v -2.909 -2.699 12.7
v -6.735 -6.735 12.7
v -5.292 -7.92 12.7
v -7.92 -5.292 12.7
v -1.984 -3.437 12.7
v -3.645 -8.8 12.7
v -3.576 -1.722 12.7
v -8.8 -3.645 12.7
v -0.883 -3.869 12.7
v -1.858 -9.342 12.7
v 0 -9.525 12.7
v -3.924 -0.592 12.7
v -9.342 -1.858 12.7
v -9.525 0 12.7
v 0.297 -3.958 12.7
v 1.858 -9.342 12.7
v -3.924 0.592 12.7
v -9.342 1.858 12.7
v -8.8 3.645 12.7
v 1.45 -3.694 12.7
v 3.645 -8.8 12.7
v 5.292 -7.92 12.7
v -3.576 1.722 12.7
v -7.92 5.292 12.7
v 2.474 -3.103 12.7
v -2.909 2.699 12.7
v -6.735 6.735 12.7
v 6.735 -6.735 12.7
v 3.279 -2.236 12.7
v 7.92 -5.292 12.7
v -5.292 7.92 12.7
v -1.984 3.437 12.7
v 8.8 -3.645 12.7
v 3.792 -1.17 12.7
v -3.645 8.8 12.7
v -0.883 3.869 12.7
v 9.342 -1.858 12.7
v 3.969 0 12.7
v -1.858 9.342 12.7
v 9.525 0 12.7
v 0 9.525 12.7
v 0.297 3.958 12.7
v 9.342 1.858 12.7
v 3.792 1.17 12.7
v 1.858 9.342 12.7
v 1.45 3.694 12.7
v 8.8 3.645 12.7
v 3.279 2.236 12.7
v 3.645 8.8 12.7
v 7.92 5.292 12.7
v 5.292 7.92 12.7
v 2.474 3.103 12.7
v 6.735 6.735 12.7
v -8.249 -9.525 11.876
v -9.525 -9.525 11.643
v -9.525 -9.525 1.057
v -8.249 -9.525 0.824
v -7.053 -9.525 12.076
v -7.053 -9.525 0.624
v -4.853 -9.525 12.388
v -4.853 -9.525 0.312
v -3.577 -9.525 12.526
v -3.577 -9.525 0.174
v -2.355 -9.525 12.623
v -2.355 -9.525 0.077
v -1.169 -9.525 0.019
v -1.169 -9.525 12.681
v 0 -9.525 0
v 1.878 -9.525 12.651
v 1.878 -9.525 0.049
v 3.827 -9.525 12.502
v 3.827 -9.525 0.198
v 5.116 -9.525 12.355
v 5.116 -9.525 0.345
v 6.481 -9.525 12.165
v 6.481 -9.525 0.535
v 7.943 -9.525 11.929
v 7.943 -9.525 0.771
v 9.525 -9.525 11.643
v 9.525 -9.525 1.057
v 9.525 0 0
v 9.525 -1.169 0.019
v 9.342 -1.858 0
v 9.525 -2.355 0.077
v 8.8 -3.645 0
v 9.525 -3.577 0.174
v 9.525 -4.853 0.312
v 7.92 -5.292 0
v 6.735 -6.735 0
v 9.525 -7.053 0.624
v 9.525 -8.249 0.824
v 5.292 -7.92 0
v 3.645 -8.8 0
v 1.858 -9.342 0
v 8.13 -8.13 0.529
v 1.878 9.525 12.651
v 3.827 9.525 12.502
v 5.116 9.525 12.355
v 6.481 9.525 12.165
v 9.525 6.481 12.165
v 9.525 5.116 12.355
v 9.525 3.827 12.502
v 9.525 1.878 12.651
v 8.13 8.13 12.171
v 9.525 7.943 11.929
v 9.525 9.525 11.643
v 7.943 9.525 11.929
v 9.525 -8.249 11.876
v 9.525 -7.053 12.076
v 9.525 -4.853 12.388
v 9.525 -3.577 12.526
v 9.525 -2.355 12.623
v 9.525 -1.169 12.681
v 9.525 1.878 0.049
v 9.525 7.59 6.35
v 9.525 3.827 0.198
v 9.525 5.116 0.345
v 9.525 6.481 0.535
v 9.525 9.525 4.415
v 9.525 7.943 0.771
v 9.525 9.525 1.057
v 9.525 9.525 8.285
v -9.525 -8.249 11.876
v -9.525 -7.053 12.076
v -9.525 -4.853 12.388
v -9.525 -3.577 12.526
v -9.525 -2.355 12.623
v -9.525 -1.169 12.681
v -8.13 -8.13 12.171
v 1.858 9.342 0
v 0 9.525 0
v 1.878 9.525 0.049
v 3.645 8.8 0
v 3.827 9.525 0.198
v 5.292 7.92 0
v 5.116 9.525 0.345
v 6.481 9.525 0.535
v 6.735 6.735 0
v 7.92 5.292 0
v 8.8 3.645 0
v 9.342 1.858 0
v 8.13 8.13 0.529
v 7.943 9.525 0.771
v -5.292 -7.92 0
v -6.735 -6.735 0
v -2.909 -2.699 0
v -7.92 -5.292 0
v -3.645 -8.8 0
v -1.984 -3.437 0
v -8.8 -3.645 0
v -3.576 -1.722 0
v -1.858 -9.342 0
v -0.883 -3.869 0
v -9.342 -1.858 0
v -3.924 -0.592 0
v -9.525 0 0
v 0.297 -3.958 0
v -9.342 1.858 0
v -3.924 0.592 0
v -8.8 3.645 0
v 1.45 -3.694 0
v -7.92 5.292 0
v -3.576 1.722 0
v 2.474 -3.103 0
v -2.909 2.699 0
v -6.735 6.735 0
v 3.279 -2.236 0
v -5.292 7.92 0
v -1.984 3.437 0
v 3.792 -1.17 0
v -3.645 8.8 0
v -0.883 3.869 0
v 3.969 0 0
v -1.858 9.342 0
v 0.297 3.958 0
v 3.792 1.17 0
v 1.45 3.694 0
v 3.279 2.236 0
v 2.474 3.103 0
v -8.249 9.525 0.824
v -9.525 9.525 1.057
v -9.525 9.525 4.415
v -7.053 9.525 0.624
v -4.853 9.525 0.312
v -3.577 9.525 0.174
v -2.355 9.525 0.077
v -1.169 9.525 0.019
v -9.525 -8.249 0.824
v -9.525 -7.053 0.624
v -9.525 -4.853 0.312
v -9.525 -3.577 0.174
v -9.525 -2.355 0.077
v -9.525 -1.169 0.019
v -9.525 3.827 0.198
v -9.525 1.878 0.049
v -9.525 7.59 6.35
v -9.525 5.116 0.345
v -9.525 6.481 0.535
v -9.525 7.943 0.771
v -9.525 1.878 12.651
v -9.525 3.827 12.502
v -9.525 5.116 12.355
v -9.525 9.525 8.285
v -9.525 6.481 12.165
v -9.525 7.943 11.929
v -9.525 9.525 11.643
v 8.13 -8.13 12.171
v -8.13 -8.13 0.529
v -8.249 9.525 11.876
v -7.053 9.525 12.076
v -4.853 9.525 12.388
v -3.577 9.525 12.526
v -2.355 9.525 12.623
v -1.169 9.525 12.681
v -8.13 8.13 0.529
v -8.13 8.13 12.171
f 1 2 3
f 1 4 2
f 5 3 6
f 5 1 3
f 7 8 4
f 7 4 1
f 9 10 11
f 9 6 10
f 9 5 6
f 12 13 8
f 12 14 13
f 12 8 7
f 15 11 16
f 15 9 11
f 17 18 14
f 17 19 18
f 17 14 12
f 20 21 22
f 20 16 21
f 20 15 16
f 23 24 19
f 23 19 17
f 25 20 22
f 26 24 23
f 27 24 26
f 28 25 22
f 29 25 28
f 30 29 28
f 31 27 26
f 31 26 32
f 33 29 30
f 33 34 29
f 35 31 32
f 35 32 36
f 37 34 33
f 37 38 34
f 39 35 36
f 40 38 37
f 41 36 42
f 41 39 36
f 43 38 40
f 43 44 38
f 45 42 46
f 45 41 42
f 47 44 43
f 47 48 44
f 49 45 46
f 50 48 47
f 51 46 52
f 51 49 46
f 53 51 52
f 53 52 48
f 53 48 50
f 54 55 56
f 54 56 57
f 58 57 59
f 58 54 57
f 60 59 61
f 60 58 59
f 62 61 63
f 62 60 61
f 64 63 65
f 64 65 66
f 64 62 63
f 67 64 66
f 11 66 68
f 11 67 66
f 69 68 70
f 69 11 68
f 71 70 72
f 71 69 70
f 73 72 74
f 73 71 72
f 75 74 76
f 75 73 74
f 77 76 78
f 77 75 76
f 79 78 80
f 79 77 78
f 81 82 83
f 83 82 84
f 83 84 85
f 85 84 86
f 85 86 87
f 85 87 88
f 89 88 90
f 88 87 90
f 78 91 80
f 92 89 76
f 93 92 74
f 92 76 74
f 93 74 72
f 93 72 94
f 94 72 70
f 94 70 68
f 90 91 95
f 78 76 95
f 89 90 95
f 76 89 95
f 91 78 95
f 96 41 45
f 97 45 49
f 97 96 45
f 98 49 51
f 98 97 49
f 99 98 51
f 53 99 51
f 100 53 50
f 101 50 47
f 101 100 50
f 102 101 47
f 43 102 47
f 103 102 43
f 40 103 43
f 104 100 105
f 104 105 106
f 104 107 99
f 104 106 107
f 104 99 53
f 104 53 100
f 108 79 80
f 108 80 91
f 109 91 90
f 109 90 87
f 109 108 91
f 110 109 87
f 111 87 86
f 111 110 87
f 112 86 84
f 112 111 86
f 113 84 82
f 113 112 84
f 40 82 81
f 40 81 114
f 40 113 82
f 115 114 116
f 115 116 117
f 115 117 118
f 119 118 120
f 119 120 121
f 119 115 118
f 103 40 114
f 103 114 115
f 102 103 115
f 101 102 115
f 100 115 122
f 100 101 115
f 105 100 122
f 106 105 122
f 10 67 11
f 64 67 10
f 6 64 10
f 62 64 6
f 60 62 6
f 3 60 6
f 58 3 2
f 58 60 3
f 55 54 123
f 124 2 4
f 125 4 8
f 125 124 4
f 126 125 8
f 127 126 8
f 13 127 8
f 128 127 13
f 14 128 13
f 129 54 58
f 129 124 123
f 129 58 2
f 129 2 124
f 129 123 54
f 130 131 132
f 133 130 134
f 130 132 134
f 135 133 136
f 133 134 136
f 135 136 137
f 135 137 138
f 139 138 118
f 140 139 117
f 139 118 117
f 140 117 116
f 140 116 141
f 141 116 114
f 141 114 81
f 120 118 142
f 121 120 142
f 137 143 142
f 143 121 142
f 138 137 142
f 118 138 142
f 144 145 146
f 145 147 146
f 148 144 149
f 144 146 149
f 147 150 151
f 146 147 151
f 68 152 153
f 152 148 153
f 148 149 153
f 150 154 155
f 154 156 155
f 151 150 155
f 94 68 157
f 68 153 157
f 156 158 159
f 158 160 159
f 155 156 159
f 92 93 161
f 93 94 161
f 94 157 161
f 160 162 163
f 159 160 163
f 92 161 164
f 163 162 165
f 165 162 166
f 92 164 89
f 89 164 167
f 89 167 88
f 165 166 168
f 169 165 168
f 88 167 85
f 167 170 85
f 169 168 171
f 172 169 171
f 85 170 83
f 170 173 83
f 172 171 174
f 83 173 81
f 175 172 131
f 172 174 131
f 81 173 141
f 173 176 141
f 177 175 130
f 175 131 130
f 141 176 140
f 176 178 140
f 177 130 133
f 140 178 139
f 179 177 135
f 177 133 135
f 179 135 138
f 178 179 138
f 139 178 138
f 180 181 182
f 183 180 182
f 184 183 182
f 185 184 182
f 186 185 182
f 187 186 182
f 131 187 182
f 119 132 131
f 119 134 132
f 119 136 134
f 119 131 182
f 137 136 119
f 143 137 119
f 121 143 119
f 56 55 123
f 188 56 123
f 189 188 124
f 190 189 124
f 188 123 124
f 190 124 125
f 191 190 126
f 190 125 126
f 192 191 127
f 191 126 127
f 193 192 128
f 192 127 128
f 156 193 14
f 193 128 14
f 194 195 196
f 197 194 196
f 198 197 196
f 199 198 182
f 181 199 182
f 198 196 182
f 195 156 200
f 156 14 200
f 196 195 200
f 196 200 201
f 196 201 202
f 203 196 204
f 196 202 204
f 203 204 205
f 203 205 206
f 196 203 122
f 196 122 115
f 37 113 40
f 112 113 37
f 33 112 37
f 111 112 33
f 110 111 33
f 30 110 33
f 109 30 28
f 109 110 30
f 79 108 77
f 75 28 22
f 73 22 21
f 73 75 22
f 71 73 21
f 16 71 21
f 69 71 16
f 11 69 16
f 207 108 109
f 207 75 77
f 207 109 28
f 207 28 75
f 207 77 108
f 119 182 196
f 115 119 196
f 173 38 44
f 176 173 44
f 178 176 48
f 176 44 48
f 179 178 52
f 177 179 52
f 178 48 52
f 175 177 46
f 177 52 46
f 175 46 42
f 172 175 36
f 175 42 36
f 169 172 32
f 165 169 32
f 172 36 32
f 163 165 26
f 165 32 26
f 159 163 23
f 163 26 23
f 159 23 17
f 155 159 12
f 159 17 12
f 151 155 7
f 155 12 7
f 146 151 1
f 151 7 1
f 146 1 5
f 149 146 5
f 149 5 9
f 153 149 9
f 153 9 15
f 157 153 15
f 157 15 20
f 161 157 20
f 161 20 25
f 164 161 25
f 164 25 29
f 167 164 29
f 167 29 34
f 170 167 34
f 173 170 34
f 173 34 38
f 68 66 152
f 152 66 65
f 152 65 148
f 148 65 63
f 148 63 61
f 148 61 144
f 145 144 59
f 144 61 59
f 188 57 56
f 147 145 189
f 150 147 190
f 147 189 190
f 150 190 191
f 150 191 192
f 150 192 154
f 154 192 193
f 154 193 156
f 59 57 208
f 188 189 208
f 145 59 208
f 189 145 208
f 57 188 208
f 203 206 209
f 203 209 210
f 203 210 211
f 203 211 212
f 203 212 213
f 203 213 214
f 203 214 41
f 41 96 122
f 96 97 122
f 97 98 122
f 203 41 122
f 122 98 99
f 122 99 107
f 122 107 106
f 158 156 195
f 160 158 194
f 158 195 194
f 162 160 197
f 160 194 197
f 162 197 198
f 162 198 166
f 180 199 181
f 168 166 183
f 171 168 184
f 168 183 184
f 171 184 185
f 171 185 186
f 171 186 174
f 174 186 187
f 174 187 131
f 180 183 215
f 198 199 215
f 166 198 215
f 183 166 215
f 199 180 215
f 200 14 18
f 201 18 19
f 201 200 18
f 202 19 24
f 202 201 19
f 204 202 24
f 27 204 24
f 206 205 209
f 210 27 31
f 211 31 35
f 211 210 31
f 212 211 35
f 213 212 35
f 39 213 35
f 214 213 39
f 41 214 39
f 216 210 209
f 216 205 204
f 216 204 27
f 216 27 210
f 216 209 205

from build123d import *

# Parameters (mm, degrees)
F0_W     = 19.05
F0_H     = 19.05
F0_R     = 3.96875
F1_DEPTH = 6.35
F6_DEPTH = 19.051


with BuildPart() as f1:
    # F0 (on Top) → F1 (new body)
    with BuildSketch(Plane.XY):
        Rectangle(F0_W, F0_H)
        Circle(F0_R, mode=Mode.SUBTRACT)
    extrude(amount=F1_DEPTH)

    # F4: sweep along a path in F2
    with BuildLine(Plane(origin=(0, 0, 0), x_dir=(1, 0, 0), z_dir=(0, 0, -1))) as f4_path:
        CenterArc((0, 0), 9.525, 0, 360)
    # F3 (on Right) → F4 (sweep, cut)
    with BuildSketch(Plane.YZ):
        Polygon((-20.809421, 0), (-9.525, 0), (-20.809421, 3.023652), align=None)
    sweep(path=f4_path.line, mode=Mode.SUBTRACT)

    # F5 (on face) → F6 (cut, through all)
    with BuildSketch(Plane(origin=(-9.525, 0, 0), x_dir=(0, -1, 0), z_dir=(-1, 0, 0))):
        Polygon((-7.59023, 6.35), (-9.525, 6.35), (-9.525, 4.41523), align=None)
    extrude(amount=-F6_DEPTH, mode=Mode.SUBTRACT)

    # F7: F1 across face


with BuildPart() as f1_1:
    add(f1.part)
    add(f1.part.mirror(Plane(origin=(0, -1.140472, 6.35), x_dir=(1, 0, 0), z_dir=(0, 0, 1))))


solid = f1_1.part
